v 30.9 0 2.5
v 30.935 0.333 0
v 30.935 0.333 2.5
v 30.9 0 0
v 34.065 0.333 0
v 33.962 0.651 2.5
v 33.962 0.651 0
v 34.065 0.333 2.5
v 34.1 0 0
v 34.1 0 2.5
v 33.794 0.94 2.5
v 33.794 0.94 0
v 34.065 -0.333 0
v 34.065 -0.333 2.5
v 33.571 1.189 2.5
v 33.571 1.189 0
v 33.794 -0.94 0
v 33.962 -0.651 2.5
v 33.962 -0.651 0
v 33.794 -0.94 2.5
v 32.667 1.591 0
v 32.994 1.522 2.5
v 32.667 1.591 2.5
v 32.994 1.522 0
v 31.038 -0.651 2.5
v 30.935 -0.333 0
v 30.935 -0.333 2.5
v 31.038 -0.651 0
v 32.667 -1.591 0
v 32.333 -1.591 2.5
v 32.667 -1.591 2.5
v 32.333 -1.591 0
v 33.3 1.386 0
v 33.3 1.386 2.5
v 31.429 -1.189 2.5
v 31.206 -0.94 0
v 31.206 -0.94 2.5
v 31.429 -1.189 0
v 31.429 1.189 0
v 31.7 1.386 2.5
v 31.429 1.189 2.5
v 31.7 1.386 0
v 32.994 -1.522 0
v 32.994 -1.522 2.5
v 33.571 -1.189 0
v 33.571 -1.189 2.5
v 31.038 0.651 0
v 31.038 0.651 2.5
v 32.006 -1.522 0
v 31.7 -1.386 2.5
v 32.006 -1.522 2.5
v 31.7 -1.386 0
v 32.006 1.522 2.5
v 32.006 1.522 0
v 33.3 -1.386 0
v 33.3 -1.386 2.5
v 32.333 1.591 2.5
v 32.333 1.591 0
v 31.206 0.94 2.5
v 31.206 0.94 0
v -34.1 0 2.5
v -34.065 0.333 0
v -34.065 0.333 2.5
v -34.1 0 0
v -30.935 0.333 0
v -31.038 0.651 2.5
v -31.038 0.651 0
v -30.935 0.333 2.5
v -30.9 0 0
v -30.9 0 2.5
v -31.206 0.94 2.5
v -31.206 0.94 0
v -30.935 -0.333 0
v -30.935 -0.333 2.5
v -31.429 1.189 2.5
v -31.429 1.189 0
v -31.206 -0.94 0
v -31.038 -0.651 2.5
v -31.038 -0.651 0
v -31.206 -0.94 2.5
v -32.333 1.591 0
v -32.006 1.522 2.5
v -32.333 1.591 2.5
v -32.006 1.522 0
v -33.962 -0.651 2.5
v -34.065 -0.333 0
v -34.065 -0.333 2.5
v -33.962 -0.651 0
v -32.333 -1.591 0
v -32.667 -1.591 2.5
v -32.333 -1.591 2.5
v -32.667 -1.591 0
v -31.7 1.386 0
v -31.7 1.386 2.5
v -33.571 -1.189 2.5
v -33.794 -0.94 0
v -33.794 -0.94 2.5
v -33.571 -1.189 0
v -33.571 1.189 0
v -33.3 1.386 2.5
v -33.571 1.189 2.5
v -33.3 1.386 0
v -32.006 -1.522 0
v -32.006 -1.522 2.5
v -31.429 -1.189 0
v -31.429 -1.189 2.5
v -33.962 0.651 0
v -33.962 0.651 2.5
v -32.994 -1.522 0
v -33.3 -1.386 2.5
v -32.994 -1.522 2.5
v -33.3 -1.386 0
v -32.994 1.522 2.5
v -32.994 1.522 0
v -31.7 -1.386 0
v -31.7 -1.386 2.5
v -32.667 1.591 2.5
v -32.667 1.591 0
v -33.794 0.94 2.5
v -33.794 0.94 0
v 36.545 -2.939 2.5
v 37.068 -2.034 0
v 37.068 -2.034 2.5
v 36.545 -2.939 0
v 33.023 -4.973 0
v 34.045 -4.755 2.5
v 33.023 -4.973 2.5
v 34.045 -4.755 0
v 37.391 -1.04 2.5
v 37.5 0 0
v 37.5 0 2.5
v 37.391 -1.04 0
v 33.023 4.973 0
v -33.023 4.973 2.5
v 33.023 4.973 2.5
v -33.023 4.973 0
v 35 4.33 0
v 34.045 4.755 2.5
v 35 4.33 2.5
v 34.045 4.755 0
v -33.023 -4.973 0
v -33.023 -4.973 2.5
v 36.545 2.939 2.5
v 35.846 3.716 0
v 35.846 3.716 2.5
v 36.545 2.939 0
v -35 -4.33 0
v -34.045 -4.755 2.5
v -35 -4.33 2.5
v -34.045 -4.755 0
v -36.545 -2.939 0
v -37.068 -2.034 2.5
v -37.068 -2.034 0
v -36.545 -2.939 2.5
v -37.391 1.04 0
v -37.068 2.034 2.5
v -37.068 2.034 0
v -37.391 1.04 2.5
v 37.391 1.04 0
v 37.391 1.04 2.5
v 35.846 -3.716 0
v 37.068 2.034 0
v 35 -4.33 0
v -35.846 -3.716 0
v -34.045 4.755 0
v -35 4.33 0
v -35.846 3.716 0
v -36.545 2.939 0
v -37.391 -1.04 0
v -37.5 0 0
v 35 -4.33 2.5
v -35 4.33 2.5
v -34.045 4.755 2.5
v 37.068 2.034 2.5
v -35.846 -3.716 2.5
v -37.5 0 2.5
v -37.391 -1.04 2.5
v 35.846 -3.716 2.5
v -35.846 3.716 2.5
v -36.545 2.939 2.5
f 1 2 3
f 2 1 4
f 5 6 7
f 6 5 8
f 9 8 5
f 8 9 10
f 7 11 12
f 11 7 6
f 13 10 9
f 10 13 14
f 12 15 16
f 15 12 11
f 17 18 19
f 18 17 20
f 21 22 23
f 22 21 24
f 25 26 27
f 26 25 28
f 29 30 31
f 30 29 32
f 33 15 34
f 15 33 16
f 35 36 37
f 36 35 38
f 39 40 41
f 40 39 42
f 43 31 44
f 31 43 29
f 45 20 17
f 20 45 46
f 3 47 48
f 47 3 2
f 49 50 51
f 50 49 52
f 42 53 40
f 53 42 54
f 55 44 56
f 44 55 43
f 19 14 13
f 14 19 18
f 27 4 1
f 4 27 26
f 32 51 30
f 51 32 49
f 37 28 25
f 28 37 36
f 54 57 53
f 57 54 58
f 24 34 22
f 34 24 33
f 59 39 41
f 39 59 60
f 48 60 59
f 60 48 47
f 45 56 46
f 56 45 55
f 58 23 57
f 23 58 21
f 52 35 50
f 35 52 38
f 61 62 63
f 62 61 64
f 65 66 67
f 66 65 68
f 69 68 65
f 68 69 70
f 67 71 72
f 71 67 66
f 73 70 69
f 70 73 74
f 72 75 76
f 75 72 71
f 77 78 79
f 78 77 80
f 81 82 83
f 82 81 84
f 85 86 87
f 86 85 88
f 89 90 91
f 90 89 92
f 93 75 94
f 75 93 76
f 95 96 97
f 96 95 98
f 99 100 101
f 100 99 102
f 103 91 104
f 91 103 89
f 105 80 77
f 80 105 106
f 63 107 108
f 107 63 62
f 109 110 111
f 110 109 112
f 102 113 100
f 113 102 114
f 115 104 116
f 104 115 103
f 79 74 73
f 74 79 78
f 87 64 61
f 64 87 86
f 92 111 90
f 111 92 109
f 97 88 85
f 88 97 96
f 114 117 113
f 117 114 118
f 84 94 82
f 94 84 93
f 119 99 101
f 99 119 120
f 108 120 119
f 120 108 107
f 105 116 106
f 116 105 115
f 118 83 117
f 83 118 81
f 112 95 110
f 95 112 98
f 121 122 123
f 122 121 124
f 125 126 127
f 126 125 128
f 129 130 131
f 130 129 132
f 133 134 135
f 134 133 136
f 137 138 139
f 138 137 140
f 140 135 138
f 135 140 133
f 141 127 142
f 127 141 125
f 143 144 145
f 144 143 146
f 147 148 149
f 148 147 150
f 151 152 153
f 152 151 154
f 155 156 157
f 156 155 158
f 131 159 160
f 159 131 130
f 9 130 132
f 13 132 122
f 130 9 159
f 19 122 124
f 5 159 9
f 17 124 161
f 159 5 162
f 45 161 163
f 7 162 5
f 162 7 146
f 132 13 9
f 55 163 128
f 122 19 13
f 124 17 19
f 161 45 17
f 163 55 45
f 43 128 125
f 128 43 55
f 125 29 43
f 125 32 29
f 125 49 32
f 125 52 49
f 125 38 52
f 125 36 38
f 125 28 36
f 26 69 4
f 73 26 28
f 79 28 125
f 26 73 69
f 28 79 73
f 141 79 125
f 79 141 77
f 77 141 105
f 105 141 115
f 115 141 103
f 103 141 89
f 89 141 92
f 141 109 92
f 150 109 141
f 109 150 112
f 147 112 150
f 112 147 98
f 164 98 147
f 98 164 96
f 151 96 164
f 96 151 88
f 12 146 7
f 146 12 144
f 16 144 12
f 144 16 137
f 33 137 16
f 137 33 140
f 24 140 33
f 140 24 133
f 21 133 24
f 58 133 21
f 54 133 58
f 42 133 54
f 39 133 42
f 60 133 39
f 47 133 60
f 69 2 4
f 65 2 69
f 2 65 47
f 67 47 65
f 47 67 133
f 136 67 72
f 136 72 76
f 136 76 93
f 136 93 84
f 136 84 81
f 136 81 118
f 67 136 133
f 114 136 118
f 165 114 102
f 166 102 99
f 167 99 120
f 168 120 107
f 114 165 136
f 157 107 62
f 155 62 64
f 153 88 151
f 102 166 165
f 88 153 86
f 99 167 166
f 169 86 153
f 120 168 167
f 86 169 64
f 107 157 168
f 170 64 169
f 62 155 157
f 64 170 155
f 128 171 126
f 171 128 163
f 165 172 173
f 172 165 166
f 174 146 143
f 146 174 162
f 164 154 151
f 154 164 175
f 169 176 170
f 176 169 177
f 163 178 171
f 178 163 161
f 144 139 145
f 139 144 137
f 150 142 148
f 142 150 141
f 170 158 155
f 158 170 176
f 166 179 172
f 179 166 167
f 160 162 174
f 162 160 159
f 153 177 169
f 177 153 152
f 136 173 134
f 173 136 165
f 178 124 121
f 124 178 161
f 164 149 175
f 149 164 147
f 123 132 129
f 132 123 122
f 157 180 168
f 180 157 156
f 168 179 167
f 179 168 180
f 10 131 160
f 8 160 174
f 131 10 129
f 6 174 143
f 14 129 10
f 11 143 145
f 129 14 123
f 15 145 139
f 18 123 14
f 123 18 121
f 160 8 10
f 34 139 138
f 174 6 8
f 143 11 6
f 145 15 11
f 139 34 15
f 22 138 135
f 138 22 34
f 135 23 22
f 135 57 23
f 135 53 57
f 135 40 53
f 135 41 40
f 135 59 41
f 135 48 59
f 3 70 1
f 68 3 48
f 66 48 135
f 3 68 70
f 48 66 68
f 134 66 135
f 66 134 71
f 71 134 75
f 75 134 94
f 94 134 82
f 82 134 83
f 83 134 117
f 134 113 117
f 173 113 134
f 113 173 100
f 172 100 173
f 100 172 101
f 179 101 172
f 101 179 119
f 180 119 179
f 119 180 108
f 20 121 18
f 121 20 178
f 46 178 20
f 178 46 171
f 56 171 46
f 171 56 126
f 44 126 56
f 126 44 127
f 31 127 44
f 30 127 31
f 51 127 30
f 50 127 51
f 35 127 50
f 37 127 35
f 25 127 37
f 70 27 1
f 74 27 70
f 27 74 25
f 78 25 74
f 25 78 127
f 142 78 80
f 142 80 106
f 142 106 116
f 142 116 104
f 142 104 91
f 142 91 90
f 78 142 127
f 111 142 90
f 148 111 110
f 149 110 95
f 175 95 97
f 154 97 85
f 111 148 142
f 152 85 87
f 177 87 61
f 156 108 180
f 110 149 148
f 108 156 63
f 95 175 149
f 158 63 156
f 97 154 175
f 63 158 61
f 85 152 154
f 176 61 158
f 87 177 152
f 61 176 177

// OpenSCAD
m3_head_clearance = 5.3;
m3_screw_clearance = 3.2;
$fn=30;

module m3_bolt(bolt_len) {
    head_len=5;
    translate([0,0,bolt_len/2]) cylinder(d=m3_screw_clearance,h=bolt_len+0.05,center=true);
    translate([0,0,-head_len/2]) cylinder(d=m3_head_clearance,h=head_len,center=true);
}

module bolts(hole_distance,bolt_len) {
    translate([hole_distance/2,0,0]) m3_bolt(bolt_len);
    translate([-hole_distance/2,0,0]) m3_bolt(bolt_len);
}

// clearance between bolthole center and belt
upper_clearance = 5.0;

// measured parameters
hole_distance = 65.0;
bolt_len = 15.0;

module support(support_th) {
    difference() {
        hull() {
            translate([hole_distance/2,0,support_th/2])
                cylinder(r=upper_clearance,h=support_th,center=true);
            translate([-hole_distance/2,0,support_th/2])
                cylinder(r=upper_clearance,h=support_th,center=true);
        }
        translate([0,0,-0.05]) bolts(hole_distance, bolt_len);
    }
}

servo_screw_hole_d = 1.8;

support(2.5);
